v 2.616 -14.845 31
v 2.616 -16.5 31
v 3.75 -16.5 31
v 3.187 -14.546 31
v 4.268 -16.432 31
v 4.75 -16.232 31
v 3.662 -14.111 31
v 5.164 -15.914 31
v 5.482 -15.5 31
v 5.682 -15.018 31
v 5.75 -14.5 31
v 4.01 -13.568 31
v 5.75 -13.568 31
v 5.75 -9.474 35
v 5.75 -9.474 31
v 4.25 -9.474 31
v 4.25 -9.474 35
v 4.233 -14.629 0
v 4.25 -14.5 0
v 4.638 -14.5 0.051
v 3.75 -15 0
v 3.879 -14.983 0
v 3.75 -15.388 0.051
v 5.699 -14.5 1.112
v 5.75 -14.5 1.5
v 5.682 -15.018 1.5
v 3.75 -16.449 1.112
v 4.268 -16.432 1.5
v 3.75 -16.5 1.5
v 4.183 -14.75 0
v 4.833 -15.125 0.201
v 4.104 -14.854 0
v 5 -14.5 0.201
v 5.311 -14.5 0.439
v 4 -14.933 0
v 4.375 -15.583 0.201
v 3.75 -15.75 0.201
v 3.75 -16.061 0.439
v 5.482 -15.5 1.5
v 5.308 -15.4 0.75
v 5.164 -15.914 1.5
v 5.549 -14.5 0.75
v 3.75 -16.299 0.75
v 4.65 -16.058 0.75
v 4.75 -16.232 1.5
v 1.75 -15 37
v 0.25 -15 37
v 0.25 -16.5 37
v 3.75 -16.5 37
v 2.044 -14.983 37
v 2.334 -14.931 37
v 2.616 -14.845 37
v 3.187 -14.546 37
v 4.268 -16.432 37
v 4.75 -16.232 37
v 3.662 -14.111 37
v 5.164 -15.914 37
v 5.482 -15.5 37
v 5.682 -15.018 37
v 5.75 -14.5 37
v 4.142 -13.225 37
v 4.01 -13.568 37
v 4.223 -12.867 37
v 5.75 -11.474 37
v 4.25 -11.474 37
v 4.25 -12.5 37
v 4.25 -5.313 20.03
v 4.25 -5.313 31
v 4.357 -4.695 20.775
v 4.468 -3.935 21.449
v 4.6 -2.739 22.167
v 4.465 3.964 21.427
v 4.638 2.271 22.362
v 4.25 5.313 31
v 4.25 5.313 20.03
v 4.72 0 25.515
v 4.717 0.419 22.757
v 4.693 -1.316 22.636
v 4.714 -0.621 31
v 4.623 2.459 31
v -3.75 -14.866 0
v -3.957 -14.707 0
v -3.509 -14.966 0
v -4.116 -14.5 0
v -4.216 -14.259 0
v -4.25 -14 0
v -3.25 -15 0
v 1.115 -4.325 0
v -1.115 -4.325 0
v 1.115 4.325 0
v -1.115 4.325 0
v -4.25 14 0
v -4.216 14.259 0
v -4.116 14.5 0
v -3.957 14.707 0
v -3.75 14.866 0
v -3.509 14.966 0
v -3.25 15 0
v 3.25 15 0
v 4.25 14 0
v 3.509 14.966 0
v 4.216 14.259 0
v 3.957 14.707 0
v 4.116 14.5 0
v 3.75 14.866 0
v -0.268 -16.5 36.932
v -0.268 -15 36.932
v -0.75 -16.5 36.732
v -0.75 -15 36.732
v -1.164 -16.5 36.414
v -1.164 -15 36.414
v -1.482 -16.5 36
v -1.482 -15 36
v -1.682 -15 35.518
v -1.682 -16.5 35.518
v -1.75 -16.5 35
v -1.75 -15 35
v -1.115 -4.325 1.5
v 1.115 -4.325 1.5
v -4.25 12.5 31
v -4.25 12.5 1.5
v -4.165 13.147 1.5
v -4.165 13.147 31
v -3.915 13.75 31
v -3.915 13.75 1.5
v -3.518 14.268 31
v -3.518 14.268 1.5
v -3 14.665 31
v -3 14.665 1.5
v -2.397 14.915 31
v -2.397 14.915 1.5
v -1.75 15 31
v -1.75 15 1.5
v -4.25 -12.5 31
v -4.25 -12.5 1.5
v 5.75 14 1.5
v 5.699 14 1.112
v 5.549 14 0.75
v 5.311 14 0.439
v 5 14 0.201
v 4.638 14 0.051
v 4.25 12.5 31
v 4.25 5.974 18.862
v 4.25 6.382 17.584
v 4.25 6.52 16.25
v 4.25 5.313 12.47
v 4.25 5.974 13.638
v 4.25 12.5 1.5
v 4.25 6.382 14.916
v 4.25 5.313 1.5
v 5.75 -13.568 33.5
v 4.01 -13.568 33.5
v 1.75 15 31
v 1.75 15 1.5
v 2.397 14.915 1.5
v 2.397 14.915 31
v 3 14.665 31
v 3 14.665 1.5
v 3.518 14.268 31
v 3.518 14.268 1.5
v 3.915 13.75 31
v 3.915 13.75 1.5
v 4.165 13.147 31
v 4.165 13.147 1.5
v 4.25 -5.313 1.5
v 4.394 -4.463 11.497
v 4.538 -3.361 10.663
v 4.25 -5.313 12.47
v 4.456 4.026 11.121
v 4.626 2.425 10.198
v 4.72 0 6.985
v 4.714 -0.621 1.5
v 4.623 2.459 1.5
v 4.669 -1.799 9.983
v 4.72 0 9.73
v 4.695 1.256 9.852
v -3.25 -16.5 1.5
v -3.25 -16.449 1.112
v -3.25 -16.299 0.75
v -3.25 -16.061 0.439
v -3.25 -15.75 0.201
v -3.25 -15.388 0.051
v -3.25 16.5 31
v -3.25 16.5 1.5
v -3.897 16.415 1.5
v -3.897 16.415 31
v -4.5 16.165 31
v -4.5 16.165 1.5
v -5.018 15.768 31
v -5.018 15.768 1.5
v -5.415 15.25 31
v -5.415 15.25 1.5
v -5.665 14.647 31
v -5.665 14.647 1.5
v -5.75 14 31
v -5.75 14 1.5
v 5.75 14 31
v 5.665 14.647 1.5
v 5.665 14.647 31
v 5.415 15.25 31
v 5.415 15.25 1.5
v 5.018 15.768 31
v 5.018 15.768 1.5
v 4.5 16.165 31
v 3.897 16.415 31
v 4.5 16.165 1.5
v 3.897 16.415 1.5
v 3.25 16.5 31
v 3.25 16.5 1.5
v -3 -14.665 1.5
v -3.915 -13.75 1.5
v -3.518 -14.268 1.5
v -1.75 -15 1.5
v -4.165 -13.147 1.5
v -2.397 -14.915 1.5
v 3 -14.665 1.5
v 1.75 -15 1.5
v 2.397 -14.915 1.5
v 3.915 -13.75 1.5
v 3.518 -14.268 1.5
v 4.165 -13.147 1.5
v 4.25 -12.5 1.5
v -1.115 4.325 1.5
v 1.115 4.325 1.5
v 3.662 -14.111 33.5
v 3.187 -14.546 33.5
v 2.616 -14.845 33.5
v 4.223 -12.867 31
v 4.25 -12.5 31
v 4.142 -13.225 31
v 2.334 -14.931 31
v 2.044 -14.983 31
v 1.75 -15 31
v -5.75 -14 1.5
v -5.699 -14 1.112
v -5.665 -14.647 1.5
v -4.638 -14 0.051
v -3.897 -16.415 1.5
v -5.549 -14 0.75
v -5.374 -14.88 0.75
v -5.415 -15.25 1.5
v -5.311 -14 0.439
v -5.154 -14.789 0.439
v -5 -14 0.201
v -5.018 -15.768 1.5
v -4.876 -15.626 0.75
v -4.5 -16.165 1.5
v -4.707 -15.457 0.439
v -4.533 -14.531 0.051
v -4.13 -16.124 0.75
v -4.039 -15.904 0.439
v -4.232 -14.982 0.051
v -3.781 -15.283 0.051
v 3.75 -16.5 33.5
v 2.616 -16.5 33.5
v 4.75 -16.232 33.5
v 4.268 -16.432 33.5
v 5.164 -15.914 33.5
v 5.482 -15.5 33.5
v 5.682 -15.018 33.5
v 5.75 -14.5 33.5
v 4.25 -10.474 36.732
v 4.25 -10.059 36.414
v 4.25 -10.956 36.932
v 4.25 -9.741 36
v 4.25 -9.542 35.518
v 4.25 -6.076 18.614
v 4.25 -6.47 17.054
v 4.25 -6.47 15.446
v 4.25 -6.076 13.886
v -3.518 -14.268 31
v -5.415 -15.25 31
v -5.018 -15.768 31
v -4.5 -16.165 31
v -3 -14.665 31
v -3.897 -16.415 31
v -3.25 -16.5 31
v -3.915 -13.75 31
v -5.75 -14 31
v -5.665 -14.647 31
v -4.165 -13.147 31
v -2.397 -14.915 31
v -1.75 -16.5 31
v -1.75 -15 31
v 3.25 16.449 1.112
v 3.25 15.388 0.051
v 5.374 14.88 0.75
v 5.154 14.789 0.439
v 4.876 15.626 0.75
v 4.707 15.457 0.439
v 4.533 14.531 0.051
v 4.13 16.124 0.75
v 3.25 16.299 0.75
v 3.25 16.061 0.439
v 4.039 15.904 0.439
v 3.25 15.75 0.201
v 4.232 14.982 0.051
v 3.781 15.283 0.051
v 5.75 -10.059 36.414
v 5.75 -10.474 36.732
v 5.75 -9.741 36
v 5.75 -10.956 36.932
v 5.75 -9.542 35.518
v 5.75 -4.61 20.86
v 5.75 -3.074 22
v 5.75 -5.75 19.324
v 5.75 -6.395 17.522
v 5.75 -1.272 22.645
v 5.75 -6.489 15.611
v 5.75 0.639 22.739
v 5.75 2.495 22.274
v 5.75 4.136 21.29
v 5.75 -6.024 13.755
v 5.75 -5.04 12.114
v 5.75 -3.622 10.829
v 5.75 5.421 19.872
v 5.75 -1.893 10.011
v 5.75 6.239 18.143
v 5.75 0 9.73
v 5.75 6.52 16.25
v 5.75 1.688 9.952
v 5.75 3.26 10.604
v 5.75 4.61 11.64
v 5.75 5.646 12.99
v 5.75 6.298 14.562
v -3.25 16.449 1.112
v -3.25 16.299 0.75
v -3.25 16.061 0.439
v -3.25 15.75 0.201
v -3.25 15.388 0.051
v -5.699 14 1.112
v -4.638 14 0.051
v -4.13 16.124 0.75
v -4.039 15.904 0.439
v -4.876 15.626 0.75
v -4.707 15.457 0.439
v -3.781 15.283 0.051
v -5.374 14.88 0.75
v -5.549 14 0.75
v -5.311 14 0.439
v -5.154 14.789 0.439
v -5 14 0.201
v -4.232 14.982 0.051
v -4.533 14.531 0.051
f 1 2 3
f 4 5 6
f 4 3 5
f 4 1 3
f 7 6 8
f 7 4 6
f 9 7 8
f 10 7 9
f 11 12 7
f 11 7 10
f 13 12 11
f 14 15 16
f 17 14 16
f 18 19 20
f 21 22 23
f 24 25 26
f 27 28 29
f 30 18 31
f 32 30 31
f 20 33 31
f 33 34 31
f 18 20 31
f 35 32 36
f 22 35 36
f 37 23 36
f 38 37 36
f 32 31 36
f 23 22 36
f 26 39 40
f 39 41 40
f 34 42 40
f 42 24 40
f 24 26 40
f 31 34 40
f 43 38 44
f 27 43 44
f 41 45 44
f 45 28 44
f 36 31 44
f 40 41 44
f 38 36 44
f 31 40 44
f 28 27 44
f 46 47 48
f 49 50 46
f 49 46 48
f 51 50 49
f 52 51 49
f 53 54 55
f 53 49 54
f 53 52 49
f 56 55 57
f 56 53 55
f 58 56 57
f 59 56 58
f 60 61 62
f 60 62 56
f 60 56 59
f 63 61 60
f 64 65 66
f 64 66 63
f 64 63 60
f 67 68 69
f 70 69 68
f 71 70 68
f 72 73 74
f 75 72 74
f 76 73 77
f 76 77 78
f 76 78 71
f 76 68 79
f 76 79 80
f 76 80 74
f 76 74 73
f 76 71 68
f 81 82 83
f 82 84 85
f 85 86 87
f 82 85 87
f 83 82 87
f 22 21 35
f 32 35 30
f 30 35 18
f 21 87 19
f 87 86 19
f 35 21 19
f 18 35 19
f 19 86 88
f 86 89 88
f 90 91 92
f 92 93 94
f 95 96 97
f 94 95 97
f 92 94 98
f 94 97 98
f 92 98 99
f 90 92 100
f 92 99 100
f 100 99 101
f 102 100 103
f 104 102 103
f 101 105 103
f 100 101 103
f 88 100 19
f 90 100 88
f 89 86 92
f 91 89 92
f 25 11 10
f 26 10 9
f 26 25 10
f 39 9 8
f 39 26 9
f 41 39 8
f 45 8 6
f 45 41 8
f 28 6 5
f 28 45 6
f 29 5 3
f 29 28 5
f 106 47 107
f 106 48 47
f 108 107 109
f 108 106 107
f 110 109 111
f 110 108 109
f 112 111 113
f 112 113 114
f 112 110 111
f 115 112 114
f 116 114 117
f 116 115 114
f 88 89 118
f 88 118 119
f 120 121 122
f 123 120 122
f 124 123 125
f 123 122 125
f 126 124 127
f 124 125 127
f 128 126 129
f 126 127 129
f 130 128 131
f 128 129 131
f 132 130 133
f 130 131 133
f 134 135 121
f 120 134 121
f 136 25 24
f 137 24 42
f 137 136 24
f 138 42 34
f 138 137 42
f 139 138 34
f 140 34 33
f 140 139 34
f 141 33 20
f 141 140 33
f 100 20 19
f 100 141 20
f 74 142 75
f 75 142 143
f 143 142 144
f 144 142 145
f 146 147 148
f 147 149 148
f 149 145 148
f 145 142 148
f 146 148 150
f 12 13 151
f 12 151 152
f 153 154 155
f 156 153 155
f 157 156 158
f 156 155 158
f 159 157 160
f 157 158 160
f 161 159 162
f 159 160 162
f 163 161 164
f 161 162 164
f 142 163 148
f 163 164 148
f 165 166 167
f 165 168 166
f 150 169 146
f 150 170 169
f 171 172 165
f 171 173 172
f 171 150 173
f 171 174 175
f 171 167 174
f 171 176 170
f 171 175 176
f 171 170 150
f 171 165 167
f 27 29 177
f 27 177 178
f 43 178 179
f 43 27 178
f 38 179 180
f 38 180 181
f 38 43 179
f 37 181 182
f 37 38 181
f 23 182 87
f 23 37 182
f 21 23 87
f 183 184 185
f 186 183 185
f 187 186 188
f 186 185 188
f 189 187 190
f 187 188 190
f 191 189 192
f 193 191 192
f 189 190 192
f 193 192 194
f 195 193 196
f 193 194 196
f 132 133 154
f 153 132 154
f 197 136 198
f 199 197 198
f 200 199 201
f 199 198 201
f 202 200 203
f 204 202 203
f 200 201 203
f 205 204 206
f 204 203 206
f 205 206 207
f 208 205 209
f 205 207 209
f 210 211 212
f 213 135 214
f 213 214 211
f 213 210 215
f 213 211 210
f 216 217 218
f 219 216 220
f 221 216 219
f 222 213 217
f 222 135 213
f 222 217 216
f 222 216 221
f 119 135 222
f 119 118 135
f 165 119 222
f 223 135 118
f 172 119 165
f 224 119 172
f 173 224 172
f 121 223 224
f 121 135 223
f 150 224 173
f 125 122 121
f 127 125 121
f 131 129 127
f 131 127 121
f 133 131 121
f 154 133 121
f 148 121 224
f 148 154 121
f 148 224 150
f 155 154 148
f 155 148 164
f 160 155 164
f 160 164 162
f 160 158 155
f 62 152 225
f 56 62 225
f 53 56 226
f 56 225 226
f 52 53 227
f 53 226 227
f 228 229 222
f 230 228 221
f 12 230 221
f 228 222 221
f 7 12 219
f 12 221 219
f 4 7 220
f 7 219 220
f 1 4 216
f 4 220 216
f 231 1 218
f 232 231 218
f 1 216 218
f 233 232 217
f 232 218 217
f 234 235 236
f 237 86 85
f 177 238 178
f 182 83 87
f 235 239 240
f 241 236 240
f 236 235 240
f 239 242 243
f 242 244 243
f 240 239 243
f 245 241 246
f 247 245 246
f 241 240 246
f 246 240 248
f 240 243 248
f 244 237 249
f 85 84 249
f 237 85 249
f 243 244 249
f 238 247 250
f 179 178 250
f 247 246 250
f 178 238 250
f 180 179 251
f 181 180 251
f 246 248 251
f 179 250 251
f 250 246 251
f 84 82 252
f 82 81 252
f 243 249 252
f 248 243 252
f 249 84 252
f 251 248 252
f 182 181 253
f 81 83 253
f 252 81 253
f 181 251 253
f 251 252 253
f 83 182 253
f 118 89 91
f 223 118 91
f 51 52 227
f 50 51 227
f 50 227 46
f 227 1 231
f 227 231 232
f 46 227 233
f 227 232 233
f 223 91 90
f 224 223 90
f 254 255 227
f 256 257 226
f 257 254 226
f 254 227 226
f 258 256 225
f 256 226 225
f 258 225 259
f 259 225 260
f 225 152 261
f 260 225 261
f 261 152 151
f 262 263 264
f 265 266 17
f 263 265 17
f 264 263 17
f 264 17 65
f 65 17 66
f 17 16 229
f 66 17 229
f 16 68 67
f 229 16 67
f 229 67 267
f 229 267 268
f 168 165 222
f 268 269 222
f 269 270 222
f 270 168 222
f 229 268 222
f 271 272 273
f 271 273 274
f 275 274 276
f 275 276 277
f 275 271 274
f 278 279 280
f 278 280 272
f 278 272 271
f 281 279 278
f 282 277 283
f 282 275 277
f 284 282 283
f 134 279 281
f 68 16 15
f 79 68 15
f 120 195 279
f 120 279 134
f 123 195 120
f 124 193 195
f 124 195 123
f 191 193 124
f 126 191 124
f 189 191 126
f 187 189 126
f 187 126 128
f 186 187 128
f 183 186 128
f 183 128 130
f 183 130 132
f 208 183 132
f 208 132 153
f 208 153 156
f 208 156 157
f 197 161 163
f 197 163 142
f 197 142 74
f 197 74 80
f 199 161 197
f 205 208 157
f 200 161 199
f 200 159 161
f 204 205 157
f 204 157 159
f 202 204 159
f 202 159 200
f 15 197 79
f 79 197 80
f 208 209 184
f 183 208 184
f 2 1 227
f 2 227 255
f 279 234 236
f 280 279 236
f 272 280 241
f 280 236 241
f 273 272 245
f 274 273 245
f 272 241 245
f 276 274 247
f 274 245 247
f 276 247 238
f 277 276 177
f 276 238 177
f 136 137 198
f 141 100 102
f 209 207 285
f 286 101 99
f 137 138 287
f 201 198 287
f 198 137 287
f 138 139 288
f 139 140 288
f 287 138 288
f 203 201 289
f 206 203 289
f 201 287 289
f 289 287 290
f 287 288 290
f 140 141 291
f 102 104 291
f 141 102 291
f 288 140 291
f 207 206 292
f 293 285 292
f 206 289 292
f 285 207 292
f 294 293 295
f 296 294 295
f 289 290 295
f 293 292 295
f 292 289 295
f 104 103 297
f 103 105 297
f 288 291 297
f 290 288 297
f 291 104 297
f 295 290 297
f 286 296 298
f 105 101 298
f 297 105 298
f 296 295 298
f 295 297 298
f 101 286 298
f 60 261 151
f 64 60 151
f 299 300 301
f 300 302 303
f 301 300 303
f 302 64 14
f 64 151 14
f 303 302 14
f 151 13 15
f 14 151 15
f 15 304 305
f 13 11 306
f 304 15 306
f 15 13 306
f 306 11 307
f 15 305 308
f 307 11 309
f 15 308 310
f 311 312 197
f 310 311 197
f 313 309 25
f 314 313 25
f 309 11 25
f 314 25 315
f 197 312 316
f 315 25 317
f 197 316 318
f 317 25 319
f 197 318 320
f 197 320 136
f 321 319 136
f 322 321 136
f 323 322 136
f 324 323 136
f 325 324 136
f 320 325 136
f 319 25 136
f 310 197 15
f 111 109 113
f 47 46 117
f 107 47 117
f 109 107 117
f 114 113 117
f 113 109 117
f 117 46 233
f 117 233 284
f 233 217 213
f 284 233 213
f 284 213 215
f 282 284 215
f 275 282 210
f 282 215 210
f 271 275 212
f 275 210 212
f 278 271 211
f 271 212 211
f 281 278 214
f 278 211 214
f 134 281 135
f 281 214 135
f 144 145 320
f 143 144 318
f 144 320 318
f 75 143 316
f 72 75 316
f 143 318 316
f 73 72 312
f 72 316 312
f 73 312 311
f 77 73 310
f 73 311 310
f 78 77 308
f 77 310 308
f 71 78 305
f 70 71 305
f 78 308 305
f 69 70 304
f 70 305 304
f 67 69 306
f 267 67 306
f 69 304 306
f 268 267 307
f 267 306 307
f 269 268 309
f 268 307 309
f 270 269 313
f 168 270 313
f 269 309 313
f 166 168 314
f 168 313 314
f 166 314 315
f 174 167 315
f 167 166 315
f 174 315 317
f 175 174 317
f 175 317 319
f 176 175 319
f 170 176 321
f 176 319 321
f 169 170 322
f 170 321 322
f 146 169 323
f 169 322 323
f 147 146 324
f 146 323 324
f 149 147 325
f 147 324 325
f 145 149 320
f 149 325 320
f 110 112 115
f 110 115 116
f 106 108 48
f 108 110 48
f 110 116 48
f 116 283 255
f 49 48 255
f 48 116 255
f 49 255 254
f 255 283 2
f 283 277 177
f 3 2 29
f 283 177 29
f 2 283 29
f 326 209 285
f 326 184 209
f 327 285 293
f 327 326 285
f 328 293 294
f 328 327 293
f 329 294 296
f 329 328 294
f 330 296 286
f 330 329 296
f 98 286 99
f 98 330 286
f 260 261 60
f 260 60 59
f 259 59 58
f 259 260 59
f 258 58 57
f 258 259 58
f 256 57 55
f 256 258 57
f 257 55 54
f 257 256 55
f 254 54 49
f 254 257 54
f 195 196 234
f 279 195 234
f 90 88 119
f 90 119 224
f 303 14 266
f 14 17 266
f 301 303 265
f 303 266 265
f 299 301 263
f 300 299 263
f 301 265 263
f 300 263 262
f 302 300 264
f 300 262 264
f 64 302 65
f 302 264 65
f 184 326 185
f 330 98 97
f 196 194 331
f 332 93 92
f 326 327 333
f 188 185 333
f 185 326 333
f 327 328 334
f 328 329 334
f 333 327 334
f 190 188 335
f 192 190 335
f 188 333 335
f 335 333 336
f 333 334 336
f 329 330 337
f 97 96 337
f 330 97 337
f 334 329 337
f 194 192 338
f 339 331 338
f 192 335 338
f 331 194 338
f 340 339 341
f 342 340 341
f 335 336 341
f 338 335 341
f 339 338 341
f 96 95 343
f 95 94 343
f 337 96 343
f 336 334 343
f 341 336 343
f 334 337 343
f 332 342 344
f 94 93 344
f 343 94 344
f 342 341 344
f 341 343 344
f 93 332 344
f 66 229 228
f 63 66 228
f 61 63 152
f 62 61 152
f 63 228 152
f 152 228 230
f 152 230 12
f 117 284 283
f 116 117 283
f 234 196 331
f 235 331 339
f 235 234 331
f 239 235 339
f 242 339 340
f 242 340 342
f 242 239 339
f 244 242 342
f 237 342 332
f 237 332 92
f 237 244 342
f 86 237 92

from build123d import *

# Parameters (mm, degrees)
F0_W         = 2.23
F0_H         = 8.65
F1_DEPTH     = 1.5
F2_DEPTH     = 31
F5_DEPTH     = 2
F6_R         = 1.5
F7_DEPTH     = 6
F8_R         = 2
F9_DEPTH     = 2.5
F10_T1_DEPTH = 13.5
F10_T3_DEPTH = 36
F10_T6_ANGLE = 90


# Not quite as in the source:
# - a fillet or chamfer that OpenCascade refuses, or shapes differently, is made with other operations: its cross-section is extruded or revolved along the edge and cut away or added
# - a feature names something its author has since deleted; it is built from what else it names


with BuildPart() as f1:
    # F0 (on Top) → F1 (new body)
    with BuildSketch(Plane.XY):
        with BuildLine():
            Line((-1.75, -15), (1.75, -15))
            ThreePointArc((1.75, -15), (3.517766953, -14.267766953), (4.25, -12.5))
            Line((4.25, -12.5), (4.25, -5.3126580607))
            add(Edge.make_bspline(
                [(4.25, -5.3126580607), (5.242489647, 0), (4.25, 5.3126580607)],
                knots=[4.2622339472, 4.2622339472, 4.2622339472, 5.1625440136, 5.1625440136, 5.1625440136], degree=2, weights=[1, 0.9003796574, 1]))
            Line((4.25, 5.3126580607), (4.25, 12.5))
            ThreePointArc((4.25, 12.5), (3.517766953, 14.267766953), (1.75, 15))
            Line((1.75, 15), (-1.75, 15))
            ThreePointArc((-1.75, 15), (-3.517766953, 14.267766953), (-4.25, 12.5))
            Line((-4.25, 12.5), (-4.25, -12.5))
            ThreePointArc((-4.25, -12.5), (-3.517766953, -14.267766953), (-1.75, -15))
        make_face()
        Rectangle(F0_W, F0_H, mode=Mode.SUBTRACT)
    extrude(amount=F1_DEPTH)

    # F0 (on Top) → F2 (join)
    with BuildSketch(Plane.XY):
        with BuildLine():
            ThreePointArc((5.75, 14), (5.017766953, 15.767766953), (3.25, 16.5))
            Line((3.25, 16.5), (-3.25, 16.5))
            ThreePointArc((-3.25, 16.5), (-5.017766953, 15.767766953), (-5.75, 14))
            Line((-5.75, 14), (-5.75, -14))
            ThreePointArc((-5.75, -14), (-5.017766953, -15.767766953), (-3.25, -16.5))
            Line((-3.25, -16.5), (5.75, -16.5))
            Line((5.75, -16.5), (5.75, 14))
        make_face()
        with BuildLine():
            ThreePointArc((4.25, -12.5), (3.517766953, -14.267766953), (1.75, -15))
            Line((1.75, -15), (-1.75, -15))
            ThreePointArc((-1.75, -15), (-3.517766953, -14.267766953), (-4.25, -12.5))
            Line((-4.25, -12.5), (-4.25, 12.5))
            ThreePointArc((-4.25, 12.5), (-3.517766953, 14.267766953), (-1.75, 15))
            Line((-1.75, 15), (1.75, 15))
            ThreePointArc((1.75, 15), (3.517766953, 14.267766953), (4.25, 12.5))
            Line((4.25, 12.5), (4.25, 5.3126580607))
            add(Edge.make_bspline(
                [(4.25, -5.3126580607), (5.242489647, 0), (4.25, 5.3126580607)],
                knots=[4.2622339472, 4.2622339472, 4.2622339472, 5.1625440136, 5.1625440136, 5.1625440136], degree=2, weights=[1, 0.9003796574, 1]))
            Line((4.25, -5.3126580607), (4.25, -12.5))
        make_face(mode=Mode.SUBTRACT)
    extrude(amount=F2_DEPTH)

    # F4 (on face) → F5 (cut)
    with BuildSketch(Plane.YZ.offset(5.75)):
        with BuildLine():
            ThreePointArc((6.52, 16.25), (-4.6103362133, 20.8603362133), (0, 9.73))
            ThreePointArc((0, 9.73), (4.6103362133, 11.6396637867), (6.52, 16.25))
        make_face()
    extrude(amount=-F5_DEPTH, mode=Mode.SUBTRACT)

    # F6
    f6_edges = [f1.edges().sort_by_distance(p)[0] for p in [
        (5.75, -1.25, 0),
    ]]
    fillet(f6_edges, radius=F6_R)

    # F3 (on face) → F7 (join)
    with BuildSketch(Plane.XY.offset(31)):
        with BuildLine():
            Line((2.6164813973, -14.8450394427), (2.6164813973, -16.5))
            Line((2.6164813973, -16.5), (5.75, -16.5))
            Line((5.75, -16.5), (5.75, -13.5683528888))
            Line((5.75, -13.5683528888), (4.0102261181, -13.5683528888))
            ThreePointArc((4.0102261181, -13.5683528888), (3.4386554151, -14.3434866121), (2.6164813973, -14.8450394427))
        make_face()
        with BuildLine():
            Line((4.0102261181, -13.5683528888), (5.75, -13.5683528888))
            Line((5.75, -13.5683528888), (5.75, -9.473525919))
            Line((5.75, -9.473525919), (4.25, -9.473525919))
            Line((4.25, -9.473525919), (4.25, -12.5))
            ThreePointArc((4.25, -12.5), (4.18932012, -13.0474644759), (4.0102261181, -13.5683528888))
        make_face()
        with BuildLine():
            Line((-1.75, -15), (-1.75, -16.5))
            Line((-1.75, -16.5), (2.6164813973, -16.5))
            Line((2.6164813973, -16.5), (2.6164813973, -14.8450394427))
            ThreePointArc((2.6164813973, -14.8450394427), (2.190114413, -14.9609549576), (1.75, -15))
            Line((1.75, -15), (-1.75, -15))
        make_face()
    extrude(amount=F7_DEPTH)

    # F8
    f8_edges = [f1.edges().sort_by_distance(p)[0] for p in [
        (-1.75, -15.75, 37),
        (5, -9.473526, 37),
    ]]
    fillet(f8_edges, radius=F8_R)

    # F3 (on face) → F9 (cut)
    with BuildSketch(Plane.XY.offset(31)):
        with BuildLine():
            Line((2.6164813973, -14.8450394427), (2.6164813973, -16.5))
            Line((2.6164813973, -16.5), (5.75, -16.5))
            Line((5.75, -16.5), (5.75, -13.5683528888))
            Line((5.75, -13.5683528888), (4.0102261181, -13.5683528888))
            ThreePointArc((4.0102261181, -13.5683528888), (3.4386554151, -14.3434866121), (2.6164813973, -14.8450394427))
        make_face()
    extrude(amount=F9_DEPTH, mode=Mode.SUBTRACT)

    # F10: fillet of radius 2 on 2 edges, made by hand

    # F10_s2 → F10_t1 (cut)
    with BuildSketch(Plane.XY.offset(28.5)):
        with BuildLine():
            ThreePointArc((5.75, -14.5), (5.1642135624, -15.9142135624), (3.75, -16.5))
            Line((3.75, -16.5), (5.75, -16.5))
            Line((5.75, -16.5), (5.75, -14.5))
        make_face()
    extrude(amount=F10_T1_DEPTH, mode=Mode.SUBTRACT)

    # F10_s4 → F10_t3 (cut)
    with BuildSketch(Plane.XY):
        with BuildLine():
            ThreePointArc((5.75, -14.5), (5.1642135624, -15.9142135624), (3.75, -16.5))
            Line((3.75, -16.5), (5.75, -16.5))
            Line((5.75, -16.5), (5.75, -14.5))
        make_face()
    extrude(amount=F10_T3_DEPTH, mode=Mode.SUBTRACT)

    # F10_s5 → F10_t6 (revolve, cut)
    with BuildSketch(Plane.XZ.offset(14.5)):
        with BuildLine():
            ThreePointArc((4.25, 0), (5.3106601718, 0.4393398282), (5.75, 1.5))
            Line((5.75, 1.5), (5.75, 0))
            Line((5.75, 0), (4.25, 0))
        make_face()
    revolve(axis=Axis((3.75, -14.5, 0), (0, 0, -1)), revolution_arc=F10_T6_ANGLE, mode=Mode.SUBTRACT)


solid = f1.part
